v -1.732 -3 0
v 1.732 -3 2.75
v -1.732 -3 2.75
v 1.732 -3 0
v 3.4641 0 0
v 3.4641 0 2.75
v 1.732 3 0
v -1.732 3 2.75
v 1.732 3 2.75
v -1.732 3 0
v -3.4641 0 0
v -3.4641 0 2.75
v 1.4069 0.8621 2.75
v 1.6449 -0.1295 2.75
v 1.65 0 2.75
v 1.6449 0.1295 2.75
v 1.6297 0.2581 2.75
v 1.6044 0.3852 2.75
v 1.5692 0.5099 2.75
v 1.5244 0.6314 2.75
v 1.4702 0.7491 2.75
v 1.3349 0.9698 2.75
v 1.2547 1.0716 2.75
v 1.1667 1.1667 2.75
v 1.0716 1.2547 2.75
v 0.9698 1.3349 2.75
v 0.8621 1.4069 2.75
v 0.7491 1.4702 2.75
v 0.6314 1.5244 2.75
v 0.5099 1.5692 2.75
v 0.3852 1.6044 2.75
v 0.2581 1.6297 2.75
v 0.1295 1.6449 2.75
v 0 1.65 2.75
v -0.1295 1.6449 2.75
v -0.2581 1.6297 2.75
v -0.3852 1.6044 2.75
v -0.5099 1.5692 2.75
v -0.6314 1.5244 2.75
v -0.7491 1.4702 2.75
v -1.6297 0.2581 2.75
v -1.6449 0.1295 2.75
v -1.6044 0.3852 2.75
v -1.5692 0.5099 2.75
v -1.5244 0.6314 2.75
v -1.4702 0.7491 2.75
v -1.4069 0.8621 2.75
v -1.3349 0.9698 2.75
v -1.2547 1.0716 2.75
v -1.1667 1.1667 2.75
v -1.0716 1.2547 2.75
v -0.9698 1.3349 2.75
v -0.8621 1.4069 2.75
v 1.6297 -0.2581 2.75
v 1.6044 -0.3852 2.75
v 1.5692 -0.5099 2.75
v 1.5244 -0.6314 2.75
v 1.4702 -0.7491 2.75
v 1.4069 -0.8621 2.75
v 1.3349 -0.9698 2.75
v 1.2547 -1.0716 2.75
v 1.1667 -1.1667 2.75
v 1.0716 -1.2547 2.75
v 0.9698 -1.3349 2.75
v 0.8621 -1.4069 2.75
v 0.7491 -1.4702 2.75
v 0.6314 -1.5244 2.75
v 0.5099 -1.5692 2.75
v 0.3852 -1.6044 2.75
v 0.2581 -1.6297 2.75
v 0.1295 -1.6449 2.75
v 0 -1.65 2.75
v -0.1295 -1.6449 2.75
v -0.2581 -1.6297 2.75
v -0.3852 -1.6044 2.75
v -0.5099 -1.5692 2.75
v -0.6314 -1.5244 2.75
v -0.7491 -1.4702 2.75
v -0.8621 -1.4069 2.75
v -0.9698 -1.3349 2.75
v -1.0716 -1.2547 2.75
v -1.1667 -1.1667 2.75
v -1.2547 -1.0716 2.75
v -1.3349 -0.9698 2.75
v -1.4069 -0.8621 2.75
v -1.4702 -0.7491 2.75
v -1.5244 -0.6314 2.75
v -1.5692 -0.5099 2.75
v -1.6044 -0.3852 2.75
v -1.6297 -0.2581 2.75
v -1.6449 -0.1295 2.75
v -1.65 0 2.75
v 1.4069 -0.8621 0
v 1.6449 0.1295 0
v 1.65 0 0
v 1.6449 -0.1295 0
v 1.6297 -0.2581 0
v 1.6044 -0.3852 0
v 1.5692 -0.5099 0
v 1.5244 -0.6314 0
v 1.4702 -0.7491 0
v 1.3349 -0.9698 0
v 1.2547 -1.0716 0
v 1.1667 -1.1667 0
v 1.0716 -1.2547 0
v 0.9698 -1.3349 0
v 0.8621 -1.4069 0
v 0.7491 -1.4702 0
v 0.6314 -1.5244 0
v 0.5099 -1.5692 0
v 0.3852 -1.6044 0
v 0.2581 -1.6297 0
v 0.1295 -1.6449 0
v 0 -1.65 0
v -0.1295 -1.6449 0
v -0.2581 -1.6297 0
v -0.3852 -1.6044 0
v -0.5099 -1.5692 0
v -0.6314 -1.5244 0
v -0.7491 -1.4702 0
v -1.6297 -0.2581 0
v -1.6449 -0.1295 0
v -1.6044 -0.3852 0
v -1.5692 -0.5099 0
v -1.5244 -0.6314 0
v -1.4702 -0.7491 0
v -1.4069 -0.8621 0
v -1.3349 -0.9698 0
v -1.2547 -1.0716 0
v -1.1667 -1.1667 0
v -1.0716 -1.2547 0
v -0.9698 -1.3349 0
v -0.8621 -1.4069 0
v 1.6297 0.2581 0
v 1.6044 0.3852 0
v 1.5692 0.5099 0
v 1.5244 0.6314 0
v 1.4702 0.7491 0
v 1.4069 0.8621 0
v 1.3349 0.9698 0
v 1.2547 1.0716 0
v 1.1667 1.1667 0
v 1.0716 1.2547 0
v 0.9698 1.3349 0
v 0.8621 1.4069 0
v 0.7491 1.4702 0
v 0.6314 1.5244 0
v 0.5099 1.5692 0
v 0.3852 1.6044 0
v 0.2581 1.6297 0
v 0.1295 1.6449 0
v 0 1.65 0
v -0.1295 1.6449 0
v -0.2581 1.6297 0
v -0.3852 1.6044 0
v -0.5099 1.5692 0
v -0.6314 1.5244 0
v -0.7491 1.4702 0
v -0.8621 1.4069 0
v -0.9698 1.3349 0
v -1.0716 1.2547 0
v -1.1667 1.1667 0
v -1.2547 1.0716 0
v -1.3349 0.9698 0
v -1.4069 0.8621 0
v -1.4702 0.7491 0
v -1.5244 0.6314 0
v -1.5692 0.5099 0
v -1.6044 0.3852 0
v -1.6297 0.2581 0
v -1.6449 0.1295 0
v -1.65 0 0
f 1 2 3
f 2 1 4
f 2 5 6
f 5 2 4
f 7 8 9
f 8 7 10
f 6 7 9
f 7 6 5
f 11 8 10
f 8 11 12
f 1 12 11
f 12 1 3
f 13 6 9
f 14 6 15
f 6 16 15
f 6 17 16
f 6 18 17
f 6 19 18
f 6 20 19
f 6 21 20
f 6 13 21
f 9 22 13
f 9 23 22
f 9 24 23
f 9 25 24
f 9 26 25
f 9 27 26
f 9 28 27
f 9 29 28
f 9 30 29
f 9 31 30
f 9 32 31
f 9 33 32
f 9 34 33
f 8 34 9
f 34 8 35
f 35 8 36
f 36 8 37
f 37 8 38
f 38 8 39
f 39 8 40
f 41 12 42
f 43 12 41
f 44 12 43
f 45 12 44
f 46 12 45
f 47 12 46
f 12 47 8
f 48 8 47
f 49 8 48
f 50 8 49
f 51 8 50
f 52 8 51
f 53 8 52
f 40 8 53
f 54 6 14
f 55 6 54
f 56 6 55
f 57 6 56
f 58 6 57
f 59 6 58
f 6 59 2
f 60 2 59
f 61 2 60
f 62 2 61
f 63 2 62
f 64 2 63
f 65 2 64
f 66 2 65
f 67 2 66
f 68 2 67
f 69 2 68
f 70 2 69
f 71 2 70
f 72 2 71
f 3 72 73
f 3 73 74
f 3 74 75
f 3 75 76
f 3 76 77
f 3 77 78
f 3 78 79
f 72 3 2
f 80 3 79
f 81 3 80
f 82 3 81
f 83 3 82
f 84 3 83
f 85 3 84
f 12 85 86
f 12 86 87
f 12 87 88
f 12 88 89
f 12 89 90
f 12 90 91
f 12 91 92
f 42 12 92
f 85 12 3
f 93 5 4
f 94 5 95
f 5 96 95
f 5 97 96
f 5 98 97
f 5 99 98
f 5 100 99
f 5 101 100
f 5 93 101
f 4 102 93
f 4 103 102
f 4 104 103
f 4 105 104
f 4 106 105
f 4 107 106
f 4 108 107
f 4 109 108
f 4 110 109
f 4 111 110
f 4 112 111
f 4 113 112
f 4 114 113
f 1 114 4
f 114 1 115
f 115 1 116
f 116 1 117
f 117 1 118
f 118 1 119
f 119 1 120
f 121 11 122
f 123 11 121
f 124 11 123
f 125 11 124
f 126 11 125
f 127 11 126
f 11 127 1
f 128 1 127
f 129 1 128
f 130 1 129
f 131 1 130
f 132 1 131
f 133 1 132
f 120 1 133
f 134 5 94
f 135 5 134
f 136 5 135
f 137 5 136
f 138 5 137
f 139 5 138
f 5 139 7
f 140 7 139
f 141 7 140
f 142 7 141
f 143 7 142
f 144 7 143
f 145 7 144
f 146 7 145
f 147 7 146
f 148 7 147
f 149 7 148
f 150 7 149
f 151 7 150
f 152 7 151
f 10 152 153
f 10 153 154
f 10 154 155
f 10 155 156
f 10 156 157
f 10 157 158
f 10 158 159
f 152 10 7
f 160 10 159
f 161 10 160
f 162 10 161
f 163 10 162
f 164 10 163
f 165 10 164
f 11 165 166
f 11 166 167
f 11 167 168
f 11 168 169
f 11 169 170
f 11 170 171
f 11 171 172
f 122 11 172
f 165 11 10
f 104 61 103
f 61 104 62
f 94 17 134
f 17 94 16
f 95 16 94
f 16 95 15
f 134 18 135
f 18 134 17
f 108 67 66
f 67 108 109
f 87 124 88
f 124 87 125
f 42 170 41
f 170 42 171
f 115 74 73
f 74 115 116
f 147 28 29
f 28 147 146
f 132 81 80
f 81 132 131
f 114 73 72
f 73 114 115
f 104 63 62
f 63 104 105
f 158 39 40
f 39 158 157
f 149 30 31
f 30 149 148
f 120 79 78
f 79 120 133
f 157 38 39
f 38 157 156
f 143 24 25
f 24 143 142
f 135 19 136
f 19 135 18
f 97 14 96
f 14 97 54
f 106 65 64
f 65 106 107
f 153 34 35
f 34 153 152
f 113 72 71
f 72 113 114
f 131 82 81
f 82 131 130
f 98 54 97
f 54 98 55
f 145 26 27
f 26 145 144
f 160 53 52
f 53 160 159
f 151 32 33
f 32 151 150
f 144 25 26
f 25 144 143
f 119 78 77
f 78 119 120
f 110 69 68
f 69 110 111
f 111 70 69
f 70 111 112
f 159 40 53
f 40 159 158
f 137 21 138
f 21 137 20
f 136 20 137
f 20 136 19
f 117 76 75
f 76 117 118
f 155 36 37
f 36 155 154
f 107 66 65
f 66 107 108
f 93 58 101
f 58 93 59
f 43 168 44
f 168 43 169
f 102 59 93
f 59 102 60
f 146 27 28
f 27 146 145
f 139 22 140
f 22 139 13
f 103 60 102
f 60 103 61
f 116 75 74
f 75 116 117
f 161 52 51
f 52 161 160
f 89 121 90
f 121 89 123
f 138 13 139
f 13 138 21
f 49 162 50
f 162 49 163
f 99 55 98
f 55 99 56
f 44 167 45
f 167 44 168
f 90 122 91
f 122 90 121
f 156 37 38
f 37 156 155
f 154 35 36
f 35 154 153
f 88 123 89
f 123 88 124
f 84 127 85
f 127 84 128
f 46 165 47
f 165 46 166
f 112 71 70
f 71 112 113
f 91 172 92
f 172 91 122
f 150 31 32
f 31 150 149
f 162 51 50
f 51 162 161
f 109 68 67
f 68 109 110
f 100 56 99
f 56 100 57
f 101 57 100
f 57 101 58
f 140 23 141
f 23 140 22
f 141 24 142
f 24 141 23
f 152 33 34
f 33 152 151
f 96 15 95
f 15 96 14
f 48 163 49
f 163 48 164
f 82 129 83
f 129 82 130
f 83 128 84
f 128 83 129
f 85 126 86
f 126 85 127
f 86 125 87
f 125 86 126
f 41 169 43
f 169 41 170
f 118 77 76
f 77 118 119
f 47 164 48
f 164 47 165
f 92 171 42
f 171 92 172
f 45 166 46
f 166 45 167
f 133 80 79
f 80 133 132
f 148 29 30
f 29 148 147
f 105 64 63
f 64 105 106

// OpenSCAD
$fn = 80;

// T-slot nut parameters (mm)
across_flats = 6.0;     // hex width across flats
thickness    = 2.75;    // nut thickness
screw_d      = 3.0;     // clearance for 3.0mm screw

// Typical M3 clearance; adjust if you want tighter/looser fit
clearance = 0.3;
hole_d = screw_d + clearance;

// Simple T-slot nut body: hex prism with through-hole
module hex_prism_across_flats(af, h) {
    // For a regular hexagon, circumradius R = af / sqrt(3)
    R = af / sqrt(3);
    cylinder(h = h, r = R, $fn = 6);
}

difference() {
    hex_prism_across_flats(across_flats, thickness);
    translate([0,0,-0.2])
        cylinder(h = thickness + 0.4, d = hole_d, $fn = 80);
}
